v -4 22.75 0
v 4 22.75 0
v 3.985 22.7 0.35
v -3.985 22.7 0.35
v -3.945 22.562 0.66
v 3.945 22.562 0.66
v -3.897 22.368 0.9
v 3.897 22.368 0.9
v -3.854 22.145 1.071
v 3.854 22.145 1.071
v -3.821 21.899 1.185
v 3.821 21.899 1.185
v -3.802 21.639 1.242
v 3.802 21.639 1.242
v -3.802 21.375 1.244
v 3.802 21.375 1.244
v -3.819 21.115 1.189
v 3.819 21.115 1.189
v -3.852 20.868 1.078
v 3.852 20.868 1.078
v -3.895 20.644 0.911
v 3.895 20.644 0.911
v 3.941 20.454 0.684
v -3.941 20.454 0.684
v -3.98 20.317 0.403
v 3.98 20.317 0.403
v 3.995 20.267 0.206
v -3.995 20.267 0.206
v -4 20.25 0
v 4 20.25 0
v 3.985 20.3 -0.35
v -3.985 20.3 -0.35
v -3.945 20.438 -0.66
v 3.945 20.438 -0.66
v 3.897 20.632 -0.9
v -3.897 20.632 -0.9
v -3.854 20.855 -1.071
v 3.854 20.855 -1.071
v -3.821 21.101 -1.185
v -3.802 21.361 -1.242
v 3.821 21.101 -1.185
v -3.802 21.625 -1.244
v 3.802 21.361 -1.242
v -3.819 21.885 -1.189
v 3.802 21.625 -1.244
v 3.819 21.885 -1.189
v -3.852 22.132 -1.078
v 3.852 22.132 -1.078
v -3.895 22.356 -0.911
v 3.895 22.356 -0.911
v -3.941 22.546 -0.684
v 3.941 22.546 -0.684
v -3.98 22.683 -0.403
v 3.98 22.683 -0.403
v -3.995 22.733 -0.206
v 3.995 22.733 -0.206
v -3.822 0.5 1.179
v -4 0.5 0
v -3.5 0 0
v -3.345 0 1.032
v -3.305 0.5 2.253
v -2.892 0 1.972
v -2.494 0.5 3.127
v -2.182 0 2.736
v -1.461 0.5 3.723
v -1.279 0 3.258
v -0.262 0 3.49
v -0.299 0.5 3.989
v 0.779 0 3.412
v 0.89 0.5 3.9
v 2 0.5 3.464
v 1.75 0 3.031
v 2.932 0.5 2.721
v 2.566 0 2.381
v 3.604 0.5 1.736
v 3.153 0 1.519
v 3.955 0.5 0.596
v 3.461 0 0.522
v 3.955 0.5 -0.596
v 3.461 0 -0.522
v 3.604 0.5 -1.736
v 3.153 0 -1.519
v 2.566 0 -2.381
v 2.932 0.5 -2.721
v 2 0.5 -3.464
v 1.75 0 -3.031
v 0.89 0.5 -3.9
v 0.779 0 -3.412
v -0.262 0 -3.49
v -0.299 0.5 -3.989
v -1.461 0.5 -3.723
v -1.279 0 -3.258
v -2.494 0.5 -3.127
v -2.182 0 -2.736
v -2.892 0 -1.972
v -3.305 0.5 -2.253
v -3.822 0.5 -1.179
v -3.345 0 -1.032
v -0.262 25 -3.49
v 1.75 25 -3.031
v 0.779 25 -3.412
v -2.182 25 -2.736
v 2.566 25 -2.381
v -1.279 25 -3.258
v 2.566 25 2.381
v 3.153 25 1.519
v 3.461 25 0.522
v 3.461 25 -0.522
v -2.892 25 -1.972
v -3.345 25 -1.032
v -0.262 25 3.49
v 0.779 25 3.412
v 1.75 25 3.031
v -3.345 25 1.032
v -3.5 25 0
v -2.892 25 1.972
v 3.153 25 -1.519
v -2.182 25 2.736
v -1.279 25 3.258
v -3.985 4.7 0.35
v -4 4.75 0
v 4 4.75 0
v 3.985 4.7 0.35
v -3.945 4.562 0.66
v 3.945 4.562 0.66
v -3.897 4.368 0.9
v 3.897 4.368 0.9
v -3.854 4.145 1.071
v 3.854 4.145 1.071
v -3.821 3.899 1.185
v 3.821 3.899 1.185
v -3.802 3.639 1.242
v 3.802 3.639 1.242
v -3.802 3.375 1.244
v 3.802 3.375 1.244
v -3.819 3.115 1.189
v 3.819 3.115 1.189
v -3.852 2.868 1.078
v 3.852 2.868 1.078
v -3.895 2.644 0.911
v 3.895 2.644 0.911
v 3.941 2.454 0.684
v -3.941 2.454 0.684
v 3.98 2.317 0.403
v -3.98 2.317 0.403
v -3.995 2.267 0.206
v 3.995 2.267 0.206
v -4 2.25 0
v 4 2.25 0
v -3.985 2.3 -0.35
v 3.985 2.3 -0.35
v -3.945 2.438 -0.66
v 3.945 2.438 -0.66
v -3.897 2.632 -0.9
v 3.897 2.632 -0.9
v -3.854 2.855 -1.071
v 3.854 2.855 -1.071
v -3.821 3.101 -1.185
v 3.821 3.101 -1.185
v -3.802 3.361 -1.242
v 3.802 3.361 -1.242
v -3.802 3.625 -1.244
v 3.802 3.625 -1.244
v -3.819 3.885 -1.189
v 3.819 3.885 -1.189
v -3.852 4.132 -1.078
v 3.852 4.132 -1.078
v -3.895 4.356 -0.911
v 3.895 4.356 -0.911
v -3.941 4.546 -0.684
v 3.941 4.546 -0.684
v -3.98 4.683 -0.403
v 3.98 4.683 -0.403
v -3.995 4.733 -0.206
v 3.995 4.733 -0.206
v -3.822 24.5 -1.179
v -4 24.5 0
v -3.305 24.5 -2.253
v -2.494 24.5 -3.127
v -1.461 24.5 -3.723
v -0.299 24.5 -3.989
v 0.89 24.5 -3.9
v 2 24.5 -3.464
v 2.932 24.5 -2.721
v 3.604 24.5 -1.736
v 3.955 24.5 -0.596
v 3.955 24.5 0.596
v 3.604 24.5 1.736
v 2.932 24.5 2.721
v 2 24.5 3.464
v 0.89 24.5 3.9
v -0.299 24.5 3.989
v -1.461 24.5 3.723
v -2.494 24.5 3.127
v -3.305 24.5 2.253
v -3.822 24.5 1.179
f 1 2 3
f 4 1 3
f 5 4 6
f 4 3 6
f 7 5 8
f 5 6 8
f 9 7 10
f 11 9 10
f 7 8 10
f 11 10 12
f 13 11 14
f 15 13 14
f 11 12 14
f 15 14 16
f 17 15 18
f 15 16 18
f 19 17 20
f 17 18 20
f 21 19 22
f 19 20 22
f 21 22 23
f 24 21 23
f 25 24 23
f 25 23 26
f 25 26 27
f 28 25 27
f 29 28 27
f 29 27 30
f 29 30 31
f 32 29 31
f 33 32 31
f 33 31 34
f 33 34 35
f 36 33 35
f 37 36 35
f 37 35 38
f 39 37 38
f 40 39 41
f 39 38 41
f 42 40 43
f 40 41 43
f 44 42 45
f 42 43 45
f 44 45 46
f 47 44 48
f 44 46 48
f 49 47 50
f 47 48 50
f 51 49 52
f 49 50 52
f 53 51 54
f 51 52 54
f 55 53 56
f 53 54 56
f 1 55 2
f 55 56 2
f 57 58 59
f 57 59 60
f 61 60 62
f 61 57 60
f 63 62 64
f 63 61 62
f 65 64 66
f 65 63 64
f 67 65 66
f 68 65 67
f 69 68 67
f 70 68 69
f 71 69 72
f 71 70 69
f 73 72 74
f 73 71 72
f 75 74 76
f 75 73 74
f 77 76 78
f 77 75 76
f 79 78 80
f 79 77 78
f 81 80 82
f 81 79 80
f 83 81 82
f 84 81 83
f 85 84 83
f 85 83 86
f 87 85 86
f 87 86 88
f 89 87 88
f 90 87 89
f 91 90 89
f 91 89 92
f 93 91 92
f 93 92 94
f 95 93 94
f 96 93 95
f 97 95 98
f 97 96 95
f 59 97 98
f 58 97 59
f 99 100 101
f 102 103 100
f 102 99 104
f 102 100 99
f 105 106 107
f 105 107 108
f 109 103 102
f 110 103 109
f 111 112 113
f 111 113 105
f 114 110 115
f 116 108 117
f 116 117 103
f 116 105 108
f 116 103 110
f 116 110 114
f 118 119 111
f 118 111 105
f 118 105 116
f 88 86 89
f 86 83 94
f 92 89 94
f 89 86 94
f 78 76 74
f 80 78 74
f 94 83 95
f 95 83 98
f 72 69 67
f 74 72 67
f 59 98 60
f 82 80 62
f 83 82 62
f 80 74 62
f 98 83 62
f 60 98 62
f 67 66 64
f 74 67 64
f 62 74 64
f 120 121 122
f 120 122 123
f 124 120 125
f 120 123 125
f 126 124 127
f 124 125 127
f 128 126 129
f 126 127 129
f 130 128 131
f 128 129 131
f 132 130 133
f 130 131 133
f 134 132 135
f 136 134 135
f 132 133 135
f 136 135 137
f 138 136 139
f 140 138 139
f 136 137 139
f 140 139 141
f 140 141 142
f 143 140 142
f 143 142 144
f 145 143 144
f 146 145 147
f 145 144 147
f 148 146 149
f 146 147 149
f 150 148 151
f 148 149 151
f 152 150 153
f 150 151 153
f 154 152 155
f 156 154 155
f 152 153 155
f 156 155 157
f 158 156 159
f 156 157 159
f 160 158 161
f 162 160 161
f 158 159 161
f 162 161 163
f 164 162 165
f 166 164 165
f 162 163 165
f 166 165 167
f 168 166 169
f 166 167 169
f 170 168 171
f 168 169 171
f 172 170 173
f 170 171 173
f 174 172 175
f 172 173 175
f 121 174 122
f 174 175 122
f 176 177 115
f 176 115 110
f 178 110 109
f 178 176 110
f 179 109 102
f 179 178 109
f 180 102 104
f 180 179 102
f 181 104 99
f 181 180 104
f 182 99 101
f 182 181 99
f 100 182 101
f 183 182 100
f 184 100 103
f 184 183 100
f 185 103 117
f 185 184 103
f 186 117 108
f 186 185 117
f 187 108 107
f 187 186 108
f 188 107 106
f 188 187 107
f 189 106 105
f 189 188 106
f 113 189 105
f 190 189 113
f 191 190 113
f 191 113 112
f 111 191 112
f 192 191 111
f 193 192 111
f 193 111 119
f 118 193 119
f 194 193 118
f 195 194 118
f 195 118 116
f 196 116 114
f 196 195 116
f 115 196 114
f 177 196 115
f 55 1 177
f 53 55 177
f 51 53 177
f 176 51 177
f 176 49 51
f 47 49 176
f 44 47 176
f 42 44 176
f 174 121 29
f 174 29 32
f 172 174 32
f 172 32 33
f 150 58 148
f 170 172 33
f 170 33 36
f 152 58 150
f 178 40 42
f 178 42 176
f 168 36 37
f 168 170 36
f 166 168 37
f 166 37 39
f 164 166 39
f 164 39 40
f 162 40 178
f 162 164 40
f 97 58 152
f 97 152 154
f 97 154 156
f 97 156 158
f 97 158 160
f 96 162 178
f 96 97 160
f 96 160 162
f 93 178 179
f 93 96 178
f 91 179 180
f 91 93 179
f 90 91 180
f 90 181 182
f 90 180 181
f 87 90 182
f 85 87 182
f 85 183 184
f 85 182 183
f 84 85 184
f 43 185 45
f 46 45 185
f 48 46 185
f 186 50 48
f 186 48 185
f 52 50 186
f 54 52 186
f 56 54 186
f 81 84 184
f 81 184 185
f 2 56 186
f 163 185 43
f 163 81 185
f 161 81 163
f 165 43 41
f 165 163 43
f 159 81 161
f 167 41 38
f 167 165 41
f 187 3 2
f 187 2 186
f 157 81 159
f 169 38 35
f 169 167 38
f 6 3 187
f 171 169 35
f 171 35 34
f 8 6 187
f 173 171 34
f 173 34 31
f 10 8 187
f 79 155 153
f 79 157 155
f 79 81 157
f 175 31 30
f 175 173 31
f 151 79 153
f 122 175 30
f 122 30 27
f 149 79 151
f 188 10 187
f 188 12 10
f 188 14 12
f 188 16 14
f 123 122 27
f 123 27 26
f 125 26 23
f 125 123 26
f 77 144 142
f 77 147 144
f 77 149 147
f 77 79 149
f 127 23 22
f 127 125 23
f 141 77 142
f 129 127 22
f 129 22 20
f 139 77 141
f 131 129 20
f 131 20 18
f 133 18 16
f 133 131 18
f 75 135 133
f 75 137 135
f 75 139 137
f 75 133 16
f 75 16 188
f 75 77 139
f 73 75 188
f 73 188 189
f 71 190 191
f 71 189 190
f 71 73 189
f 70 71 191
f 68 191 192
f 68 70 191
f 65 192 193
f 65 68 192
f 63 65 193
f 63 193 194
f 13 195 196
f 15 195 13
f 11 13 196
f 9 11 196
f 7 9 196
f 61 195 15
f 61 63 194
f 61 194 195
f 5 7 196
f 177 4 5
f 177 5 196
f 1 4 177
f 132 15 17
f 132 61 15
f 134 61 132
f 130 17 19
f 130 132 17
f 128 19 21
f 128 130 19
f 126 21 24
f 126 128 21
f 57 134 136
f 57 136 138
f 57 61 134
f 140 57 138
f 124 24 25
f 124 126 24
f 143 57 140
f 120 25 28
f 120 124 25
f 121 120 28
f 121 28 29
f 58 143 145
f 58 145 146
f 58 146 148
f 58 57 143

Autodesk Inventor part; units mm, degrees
ref_plane "XZ Plane" through (0, 0, 0) normal (0, 1, 0) x (-1, 0, 0)
ref_plane "XY Plane" through (0, 0, 0) normal (0, 0, 1) x (1, 0, 0)
sketch "Sketch2" plane through (0, 0, 0) normal (0, 1, 0) x (-1, 0, 0)
  circle A0 centre (0, 0) radius 4
  dimension "d6" = 8
extrude "Extrusion1" add sketch "Sketch2" along normal blind 25
chamfer "Chamfer1" distance 0.5 angle 45 1 edges at (4, 25, 0)
chamfer "Chamfer2" distance 0.5 angle 45 1 edges at (4, 0, 0)
ref_plane "Work Plane1" through (4, 0, 0) normal (1, 0, 0) x (0, 1, 0)
sketch "Sketch3" plane through (4, 0, 0) normal (1, 0, 0) x (0, 1, 0)
  circle A0 centre (3.5, 0) radius 1.25
  circle A1 centre (21.5, 0) radius 1.25
  line L0 (0, -3.5) -> (0, 3.5) construction
  line L1 (2.25, 0) -> (1.3552, 0) construction
  line L2 (22.75, 0) -> (24.5, 0) construction
  line L3 (24.5, -4) -> (24.5, 4) construction
  point P0 (0, 0)
  dimension "d15" = 2.5
  dimension "d16" = 2.5
  dimension "d17" = 18
  dimension "d19" = 3.5
extrude "Extrusion2" cut sketch "Sketch3" against normal blind 25
properties part number "reverse gear crankshaft center rod"
